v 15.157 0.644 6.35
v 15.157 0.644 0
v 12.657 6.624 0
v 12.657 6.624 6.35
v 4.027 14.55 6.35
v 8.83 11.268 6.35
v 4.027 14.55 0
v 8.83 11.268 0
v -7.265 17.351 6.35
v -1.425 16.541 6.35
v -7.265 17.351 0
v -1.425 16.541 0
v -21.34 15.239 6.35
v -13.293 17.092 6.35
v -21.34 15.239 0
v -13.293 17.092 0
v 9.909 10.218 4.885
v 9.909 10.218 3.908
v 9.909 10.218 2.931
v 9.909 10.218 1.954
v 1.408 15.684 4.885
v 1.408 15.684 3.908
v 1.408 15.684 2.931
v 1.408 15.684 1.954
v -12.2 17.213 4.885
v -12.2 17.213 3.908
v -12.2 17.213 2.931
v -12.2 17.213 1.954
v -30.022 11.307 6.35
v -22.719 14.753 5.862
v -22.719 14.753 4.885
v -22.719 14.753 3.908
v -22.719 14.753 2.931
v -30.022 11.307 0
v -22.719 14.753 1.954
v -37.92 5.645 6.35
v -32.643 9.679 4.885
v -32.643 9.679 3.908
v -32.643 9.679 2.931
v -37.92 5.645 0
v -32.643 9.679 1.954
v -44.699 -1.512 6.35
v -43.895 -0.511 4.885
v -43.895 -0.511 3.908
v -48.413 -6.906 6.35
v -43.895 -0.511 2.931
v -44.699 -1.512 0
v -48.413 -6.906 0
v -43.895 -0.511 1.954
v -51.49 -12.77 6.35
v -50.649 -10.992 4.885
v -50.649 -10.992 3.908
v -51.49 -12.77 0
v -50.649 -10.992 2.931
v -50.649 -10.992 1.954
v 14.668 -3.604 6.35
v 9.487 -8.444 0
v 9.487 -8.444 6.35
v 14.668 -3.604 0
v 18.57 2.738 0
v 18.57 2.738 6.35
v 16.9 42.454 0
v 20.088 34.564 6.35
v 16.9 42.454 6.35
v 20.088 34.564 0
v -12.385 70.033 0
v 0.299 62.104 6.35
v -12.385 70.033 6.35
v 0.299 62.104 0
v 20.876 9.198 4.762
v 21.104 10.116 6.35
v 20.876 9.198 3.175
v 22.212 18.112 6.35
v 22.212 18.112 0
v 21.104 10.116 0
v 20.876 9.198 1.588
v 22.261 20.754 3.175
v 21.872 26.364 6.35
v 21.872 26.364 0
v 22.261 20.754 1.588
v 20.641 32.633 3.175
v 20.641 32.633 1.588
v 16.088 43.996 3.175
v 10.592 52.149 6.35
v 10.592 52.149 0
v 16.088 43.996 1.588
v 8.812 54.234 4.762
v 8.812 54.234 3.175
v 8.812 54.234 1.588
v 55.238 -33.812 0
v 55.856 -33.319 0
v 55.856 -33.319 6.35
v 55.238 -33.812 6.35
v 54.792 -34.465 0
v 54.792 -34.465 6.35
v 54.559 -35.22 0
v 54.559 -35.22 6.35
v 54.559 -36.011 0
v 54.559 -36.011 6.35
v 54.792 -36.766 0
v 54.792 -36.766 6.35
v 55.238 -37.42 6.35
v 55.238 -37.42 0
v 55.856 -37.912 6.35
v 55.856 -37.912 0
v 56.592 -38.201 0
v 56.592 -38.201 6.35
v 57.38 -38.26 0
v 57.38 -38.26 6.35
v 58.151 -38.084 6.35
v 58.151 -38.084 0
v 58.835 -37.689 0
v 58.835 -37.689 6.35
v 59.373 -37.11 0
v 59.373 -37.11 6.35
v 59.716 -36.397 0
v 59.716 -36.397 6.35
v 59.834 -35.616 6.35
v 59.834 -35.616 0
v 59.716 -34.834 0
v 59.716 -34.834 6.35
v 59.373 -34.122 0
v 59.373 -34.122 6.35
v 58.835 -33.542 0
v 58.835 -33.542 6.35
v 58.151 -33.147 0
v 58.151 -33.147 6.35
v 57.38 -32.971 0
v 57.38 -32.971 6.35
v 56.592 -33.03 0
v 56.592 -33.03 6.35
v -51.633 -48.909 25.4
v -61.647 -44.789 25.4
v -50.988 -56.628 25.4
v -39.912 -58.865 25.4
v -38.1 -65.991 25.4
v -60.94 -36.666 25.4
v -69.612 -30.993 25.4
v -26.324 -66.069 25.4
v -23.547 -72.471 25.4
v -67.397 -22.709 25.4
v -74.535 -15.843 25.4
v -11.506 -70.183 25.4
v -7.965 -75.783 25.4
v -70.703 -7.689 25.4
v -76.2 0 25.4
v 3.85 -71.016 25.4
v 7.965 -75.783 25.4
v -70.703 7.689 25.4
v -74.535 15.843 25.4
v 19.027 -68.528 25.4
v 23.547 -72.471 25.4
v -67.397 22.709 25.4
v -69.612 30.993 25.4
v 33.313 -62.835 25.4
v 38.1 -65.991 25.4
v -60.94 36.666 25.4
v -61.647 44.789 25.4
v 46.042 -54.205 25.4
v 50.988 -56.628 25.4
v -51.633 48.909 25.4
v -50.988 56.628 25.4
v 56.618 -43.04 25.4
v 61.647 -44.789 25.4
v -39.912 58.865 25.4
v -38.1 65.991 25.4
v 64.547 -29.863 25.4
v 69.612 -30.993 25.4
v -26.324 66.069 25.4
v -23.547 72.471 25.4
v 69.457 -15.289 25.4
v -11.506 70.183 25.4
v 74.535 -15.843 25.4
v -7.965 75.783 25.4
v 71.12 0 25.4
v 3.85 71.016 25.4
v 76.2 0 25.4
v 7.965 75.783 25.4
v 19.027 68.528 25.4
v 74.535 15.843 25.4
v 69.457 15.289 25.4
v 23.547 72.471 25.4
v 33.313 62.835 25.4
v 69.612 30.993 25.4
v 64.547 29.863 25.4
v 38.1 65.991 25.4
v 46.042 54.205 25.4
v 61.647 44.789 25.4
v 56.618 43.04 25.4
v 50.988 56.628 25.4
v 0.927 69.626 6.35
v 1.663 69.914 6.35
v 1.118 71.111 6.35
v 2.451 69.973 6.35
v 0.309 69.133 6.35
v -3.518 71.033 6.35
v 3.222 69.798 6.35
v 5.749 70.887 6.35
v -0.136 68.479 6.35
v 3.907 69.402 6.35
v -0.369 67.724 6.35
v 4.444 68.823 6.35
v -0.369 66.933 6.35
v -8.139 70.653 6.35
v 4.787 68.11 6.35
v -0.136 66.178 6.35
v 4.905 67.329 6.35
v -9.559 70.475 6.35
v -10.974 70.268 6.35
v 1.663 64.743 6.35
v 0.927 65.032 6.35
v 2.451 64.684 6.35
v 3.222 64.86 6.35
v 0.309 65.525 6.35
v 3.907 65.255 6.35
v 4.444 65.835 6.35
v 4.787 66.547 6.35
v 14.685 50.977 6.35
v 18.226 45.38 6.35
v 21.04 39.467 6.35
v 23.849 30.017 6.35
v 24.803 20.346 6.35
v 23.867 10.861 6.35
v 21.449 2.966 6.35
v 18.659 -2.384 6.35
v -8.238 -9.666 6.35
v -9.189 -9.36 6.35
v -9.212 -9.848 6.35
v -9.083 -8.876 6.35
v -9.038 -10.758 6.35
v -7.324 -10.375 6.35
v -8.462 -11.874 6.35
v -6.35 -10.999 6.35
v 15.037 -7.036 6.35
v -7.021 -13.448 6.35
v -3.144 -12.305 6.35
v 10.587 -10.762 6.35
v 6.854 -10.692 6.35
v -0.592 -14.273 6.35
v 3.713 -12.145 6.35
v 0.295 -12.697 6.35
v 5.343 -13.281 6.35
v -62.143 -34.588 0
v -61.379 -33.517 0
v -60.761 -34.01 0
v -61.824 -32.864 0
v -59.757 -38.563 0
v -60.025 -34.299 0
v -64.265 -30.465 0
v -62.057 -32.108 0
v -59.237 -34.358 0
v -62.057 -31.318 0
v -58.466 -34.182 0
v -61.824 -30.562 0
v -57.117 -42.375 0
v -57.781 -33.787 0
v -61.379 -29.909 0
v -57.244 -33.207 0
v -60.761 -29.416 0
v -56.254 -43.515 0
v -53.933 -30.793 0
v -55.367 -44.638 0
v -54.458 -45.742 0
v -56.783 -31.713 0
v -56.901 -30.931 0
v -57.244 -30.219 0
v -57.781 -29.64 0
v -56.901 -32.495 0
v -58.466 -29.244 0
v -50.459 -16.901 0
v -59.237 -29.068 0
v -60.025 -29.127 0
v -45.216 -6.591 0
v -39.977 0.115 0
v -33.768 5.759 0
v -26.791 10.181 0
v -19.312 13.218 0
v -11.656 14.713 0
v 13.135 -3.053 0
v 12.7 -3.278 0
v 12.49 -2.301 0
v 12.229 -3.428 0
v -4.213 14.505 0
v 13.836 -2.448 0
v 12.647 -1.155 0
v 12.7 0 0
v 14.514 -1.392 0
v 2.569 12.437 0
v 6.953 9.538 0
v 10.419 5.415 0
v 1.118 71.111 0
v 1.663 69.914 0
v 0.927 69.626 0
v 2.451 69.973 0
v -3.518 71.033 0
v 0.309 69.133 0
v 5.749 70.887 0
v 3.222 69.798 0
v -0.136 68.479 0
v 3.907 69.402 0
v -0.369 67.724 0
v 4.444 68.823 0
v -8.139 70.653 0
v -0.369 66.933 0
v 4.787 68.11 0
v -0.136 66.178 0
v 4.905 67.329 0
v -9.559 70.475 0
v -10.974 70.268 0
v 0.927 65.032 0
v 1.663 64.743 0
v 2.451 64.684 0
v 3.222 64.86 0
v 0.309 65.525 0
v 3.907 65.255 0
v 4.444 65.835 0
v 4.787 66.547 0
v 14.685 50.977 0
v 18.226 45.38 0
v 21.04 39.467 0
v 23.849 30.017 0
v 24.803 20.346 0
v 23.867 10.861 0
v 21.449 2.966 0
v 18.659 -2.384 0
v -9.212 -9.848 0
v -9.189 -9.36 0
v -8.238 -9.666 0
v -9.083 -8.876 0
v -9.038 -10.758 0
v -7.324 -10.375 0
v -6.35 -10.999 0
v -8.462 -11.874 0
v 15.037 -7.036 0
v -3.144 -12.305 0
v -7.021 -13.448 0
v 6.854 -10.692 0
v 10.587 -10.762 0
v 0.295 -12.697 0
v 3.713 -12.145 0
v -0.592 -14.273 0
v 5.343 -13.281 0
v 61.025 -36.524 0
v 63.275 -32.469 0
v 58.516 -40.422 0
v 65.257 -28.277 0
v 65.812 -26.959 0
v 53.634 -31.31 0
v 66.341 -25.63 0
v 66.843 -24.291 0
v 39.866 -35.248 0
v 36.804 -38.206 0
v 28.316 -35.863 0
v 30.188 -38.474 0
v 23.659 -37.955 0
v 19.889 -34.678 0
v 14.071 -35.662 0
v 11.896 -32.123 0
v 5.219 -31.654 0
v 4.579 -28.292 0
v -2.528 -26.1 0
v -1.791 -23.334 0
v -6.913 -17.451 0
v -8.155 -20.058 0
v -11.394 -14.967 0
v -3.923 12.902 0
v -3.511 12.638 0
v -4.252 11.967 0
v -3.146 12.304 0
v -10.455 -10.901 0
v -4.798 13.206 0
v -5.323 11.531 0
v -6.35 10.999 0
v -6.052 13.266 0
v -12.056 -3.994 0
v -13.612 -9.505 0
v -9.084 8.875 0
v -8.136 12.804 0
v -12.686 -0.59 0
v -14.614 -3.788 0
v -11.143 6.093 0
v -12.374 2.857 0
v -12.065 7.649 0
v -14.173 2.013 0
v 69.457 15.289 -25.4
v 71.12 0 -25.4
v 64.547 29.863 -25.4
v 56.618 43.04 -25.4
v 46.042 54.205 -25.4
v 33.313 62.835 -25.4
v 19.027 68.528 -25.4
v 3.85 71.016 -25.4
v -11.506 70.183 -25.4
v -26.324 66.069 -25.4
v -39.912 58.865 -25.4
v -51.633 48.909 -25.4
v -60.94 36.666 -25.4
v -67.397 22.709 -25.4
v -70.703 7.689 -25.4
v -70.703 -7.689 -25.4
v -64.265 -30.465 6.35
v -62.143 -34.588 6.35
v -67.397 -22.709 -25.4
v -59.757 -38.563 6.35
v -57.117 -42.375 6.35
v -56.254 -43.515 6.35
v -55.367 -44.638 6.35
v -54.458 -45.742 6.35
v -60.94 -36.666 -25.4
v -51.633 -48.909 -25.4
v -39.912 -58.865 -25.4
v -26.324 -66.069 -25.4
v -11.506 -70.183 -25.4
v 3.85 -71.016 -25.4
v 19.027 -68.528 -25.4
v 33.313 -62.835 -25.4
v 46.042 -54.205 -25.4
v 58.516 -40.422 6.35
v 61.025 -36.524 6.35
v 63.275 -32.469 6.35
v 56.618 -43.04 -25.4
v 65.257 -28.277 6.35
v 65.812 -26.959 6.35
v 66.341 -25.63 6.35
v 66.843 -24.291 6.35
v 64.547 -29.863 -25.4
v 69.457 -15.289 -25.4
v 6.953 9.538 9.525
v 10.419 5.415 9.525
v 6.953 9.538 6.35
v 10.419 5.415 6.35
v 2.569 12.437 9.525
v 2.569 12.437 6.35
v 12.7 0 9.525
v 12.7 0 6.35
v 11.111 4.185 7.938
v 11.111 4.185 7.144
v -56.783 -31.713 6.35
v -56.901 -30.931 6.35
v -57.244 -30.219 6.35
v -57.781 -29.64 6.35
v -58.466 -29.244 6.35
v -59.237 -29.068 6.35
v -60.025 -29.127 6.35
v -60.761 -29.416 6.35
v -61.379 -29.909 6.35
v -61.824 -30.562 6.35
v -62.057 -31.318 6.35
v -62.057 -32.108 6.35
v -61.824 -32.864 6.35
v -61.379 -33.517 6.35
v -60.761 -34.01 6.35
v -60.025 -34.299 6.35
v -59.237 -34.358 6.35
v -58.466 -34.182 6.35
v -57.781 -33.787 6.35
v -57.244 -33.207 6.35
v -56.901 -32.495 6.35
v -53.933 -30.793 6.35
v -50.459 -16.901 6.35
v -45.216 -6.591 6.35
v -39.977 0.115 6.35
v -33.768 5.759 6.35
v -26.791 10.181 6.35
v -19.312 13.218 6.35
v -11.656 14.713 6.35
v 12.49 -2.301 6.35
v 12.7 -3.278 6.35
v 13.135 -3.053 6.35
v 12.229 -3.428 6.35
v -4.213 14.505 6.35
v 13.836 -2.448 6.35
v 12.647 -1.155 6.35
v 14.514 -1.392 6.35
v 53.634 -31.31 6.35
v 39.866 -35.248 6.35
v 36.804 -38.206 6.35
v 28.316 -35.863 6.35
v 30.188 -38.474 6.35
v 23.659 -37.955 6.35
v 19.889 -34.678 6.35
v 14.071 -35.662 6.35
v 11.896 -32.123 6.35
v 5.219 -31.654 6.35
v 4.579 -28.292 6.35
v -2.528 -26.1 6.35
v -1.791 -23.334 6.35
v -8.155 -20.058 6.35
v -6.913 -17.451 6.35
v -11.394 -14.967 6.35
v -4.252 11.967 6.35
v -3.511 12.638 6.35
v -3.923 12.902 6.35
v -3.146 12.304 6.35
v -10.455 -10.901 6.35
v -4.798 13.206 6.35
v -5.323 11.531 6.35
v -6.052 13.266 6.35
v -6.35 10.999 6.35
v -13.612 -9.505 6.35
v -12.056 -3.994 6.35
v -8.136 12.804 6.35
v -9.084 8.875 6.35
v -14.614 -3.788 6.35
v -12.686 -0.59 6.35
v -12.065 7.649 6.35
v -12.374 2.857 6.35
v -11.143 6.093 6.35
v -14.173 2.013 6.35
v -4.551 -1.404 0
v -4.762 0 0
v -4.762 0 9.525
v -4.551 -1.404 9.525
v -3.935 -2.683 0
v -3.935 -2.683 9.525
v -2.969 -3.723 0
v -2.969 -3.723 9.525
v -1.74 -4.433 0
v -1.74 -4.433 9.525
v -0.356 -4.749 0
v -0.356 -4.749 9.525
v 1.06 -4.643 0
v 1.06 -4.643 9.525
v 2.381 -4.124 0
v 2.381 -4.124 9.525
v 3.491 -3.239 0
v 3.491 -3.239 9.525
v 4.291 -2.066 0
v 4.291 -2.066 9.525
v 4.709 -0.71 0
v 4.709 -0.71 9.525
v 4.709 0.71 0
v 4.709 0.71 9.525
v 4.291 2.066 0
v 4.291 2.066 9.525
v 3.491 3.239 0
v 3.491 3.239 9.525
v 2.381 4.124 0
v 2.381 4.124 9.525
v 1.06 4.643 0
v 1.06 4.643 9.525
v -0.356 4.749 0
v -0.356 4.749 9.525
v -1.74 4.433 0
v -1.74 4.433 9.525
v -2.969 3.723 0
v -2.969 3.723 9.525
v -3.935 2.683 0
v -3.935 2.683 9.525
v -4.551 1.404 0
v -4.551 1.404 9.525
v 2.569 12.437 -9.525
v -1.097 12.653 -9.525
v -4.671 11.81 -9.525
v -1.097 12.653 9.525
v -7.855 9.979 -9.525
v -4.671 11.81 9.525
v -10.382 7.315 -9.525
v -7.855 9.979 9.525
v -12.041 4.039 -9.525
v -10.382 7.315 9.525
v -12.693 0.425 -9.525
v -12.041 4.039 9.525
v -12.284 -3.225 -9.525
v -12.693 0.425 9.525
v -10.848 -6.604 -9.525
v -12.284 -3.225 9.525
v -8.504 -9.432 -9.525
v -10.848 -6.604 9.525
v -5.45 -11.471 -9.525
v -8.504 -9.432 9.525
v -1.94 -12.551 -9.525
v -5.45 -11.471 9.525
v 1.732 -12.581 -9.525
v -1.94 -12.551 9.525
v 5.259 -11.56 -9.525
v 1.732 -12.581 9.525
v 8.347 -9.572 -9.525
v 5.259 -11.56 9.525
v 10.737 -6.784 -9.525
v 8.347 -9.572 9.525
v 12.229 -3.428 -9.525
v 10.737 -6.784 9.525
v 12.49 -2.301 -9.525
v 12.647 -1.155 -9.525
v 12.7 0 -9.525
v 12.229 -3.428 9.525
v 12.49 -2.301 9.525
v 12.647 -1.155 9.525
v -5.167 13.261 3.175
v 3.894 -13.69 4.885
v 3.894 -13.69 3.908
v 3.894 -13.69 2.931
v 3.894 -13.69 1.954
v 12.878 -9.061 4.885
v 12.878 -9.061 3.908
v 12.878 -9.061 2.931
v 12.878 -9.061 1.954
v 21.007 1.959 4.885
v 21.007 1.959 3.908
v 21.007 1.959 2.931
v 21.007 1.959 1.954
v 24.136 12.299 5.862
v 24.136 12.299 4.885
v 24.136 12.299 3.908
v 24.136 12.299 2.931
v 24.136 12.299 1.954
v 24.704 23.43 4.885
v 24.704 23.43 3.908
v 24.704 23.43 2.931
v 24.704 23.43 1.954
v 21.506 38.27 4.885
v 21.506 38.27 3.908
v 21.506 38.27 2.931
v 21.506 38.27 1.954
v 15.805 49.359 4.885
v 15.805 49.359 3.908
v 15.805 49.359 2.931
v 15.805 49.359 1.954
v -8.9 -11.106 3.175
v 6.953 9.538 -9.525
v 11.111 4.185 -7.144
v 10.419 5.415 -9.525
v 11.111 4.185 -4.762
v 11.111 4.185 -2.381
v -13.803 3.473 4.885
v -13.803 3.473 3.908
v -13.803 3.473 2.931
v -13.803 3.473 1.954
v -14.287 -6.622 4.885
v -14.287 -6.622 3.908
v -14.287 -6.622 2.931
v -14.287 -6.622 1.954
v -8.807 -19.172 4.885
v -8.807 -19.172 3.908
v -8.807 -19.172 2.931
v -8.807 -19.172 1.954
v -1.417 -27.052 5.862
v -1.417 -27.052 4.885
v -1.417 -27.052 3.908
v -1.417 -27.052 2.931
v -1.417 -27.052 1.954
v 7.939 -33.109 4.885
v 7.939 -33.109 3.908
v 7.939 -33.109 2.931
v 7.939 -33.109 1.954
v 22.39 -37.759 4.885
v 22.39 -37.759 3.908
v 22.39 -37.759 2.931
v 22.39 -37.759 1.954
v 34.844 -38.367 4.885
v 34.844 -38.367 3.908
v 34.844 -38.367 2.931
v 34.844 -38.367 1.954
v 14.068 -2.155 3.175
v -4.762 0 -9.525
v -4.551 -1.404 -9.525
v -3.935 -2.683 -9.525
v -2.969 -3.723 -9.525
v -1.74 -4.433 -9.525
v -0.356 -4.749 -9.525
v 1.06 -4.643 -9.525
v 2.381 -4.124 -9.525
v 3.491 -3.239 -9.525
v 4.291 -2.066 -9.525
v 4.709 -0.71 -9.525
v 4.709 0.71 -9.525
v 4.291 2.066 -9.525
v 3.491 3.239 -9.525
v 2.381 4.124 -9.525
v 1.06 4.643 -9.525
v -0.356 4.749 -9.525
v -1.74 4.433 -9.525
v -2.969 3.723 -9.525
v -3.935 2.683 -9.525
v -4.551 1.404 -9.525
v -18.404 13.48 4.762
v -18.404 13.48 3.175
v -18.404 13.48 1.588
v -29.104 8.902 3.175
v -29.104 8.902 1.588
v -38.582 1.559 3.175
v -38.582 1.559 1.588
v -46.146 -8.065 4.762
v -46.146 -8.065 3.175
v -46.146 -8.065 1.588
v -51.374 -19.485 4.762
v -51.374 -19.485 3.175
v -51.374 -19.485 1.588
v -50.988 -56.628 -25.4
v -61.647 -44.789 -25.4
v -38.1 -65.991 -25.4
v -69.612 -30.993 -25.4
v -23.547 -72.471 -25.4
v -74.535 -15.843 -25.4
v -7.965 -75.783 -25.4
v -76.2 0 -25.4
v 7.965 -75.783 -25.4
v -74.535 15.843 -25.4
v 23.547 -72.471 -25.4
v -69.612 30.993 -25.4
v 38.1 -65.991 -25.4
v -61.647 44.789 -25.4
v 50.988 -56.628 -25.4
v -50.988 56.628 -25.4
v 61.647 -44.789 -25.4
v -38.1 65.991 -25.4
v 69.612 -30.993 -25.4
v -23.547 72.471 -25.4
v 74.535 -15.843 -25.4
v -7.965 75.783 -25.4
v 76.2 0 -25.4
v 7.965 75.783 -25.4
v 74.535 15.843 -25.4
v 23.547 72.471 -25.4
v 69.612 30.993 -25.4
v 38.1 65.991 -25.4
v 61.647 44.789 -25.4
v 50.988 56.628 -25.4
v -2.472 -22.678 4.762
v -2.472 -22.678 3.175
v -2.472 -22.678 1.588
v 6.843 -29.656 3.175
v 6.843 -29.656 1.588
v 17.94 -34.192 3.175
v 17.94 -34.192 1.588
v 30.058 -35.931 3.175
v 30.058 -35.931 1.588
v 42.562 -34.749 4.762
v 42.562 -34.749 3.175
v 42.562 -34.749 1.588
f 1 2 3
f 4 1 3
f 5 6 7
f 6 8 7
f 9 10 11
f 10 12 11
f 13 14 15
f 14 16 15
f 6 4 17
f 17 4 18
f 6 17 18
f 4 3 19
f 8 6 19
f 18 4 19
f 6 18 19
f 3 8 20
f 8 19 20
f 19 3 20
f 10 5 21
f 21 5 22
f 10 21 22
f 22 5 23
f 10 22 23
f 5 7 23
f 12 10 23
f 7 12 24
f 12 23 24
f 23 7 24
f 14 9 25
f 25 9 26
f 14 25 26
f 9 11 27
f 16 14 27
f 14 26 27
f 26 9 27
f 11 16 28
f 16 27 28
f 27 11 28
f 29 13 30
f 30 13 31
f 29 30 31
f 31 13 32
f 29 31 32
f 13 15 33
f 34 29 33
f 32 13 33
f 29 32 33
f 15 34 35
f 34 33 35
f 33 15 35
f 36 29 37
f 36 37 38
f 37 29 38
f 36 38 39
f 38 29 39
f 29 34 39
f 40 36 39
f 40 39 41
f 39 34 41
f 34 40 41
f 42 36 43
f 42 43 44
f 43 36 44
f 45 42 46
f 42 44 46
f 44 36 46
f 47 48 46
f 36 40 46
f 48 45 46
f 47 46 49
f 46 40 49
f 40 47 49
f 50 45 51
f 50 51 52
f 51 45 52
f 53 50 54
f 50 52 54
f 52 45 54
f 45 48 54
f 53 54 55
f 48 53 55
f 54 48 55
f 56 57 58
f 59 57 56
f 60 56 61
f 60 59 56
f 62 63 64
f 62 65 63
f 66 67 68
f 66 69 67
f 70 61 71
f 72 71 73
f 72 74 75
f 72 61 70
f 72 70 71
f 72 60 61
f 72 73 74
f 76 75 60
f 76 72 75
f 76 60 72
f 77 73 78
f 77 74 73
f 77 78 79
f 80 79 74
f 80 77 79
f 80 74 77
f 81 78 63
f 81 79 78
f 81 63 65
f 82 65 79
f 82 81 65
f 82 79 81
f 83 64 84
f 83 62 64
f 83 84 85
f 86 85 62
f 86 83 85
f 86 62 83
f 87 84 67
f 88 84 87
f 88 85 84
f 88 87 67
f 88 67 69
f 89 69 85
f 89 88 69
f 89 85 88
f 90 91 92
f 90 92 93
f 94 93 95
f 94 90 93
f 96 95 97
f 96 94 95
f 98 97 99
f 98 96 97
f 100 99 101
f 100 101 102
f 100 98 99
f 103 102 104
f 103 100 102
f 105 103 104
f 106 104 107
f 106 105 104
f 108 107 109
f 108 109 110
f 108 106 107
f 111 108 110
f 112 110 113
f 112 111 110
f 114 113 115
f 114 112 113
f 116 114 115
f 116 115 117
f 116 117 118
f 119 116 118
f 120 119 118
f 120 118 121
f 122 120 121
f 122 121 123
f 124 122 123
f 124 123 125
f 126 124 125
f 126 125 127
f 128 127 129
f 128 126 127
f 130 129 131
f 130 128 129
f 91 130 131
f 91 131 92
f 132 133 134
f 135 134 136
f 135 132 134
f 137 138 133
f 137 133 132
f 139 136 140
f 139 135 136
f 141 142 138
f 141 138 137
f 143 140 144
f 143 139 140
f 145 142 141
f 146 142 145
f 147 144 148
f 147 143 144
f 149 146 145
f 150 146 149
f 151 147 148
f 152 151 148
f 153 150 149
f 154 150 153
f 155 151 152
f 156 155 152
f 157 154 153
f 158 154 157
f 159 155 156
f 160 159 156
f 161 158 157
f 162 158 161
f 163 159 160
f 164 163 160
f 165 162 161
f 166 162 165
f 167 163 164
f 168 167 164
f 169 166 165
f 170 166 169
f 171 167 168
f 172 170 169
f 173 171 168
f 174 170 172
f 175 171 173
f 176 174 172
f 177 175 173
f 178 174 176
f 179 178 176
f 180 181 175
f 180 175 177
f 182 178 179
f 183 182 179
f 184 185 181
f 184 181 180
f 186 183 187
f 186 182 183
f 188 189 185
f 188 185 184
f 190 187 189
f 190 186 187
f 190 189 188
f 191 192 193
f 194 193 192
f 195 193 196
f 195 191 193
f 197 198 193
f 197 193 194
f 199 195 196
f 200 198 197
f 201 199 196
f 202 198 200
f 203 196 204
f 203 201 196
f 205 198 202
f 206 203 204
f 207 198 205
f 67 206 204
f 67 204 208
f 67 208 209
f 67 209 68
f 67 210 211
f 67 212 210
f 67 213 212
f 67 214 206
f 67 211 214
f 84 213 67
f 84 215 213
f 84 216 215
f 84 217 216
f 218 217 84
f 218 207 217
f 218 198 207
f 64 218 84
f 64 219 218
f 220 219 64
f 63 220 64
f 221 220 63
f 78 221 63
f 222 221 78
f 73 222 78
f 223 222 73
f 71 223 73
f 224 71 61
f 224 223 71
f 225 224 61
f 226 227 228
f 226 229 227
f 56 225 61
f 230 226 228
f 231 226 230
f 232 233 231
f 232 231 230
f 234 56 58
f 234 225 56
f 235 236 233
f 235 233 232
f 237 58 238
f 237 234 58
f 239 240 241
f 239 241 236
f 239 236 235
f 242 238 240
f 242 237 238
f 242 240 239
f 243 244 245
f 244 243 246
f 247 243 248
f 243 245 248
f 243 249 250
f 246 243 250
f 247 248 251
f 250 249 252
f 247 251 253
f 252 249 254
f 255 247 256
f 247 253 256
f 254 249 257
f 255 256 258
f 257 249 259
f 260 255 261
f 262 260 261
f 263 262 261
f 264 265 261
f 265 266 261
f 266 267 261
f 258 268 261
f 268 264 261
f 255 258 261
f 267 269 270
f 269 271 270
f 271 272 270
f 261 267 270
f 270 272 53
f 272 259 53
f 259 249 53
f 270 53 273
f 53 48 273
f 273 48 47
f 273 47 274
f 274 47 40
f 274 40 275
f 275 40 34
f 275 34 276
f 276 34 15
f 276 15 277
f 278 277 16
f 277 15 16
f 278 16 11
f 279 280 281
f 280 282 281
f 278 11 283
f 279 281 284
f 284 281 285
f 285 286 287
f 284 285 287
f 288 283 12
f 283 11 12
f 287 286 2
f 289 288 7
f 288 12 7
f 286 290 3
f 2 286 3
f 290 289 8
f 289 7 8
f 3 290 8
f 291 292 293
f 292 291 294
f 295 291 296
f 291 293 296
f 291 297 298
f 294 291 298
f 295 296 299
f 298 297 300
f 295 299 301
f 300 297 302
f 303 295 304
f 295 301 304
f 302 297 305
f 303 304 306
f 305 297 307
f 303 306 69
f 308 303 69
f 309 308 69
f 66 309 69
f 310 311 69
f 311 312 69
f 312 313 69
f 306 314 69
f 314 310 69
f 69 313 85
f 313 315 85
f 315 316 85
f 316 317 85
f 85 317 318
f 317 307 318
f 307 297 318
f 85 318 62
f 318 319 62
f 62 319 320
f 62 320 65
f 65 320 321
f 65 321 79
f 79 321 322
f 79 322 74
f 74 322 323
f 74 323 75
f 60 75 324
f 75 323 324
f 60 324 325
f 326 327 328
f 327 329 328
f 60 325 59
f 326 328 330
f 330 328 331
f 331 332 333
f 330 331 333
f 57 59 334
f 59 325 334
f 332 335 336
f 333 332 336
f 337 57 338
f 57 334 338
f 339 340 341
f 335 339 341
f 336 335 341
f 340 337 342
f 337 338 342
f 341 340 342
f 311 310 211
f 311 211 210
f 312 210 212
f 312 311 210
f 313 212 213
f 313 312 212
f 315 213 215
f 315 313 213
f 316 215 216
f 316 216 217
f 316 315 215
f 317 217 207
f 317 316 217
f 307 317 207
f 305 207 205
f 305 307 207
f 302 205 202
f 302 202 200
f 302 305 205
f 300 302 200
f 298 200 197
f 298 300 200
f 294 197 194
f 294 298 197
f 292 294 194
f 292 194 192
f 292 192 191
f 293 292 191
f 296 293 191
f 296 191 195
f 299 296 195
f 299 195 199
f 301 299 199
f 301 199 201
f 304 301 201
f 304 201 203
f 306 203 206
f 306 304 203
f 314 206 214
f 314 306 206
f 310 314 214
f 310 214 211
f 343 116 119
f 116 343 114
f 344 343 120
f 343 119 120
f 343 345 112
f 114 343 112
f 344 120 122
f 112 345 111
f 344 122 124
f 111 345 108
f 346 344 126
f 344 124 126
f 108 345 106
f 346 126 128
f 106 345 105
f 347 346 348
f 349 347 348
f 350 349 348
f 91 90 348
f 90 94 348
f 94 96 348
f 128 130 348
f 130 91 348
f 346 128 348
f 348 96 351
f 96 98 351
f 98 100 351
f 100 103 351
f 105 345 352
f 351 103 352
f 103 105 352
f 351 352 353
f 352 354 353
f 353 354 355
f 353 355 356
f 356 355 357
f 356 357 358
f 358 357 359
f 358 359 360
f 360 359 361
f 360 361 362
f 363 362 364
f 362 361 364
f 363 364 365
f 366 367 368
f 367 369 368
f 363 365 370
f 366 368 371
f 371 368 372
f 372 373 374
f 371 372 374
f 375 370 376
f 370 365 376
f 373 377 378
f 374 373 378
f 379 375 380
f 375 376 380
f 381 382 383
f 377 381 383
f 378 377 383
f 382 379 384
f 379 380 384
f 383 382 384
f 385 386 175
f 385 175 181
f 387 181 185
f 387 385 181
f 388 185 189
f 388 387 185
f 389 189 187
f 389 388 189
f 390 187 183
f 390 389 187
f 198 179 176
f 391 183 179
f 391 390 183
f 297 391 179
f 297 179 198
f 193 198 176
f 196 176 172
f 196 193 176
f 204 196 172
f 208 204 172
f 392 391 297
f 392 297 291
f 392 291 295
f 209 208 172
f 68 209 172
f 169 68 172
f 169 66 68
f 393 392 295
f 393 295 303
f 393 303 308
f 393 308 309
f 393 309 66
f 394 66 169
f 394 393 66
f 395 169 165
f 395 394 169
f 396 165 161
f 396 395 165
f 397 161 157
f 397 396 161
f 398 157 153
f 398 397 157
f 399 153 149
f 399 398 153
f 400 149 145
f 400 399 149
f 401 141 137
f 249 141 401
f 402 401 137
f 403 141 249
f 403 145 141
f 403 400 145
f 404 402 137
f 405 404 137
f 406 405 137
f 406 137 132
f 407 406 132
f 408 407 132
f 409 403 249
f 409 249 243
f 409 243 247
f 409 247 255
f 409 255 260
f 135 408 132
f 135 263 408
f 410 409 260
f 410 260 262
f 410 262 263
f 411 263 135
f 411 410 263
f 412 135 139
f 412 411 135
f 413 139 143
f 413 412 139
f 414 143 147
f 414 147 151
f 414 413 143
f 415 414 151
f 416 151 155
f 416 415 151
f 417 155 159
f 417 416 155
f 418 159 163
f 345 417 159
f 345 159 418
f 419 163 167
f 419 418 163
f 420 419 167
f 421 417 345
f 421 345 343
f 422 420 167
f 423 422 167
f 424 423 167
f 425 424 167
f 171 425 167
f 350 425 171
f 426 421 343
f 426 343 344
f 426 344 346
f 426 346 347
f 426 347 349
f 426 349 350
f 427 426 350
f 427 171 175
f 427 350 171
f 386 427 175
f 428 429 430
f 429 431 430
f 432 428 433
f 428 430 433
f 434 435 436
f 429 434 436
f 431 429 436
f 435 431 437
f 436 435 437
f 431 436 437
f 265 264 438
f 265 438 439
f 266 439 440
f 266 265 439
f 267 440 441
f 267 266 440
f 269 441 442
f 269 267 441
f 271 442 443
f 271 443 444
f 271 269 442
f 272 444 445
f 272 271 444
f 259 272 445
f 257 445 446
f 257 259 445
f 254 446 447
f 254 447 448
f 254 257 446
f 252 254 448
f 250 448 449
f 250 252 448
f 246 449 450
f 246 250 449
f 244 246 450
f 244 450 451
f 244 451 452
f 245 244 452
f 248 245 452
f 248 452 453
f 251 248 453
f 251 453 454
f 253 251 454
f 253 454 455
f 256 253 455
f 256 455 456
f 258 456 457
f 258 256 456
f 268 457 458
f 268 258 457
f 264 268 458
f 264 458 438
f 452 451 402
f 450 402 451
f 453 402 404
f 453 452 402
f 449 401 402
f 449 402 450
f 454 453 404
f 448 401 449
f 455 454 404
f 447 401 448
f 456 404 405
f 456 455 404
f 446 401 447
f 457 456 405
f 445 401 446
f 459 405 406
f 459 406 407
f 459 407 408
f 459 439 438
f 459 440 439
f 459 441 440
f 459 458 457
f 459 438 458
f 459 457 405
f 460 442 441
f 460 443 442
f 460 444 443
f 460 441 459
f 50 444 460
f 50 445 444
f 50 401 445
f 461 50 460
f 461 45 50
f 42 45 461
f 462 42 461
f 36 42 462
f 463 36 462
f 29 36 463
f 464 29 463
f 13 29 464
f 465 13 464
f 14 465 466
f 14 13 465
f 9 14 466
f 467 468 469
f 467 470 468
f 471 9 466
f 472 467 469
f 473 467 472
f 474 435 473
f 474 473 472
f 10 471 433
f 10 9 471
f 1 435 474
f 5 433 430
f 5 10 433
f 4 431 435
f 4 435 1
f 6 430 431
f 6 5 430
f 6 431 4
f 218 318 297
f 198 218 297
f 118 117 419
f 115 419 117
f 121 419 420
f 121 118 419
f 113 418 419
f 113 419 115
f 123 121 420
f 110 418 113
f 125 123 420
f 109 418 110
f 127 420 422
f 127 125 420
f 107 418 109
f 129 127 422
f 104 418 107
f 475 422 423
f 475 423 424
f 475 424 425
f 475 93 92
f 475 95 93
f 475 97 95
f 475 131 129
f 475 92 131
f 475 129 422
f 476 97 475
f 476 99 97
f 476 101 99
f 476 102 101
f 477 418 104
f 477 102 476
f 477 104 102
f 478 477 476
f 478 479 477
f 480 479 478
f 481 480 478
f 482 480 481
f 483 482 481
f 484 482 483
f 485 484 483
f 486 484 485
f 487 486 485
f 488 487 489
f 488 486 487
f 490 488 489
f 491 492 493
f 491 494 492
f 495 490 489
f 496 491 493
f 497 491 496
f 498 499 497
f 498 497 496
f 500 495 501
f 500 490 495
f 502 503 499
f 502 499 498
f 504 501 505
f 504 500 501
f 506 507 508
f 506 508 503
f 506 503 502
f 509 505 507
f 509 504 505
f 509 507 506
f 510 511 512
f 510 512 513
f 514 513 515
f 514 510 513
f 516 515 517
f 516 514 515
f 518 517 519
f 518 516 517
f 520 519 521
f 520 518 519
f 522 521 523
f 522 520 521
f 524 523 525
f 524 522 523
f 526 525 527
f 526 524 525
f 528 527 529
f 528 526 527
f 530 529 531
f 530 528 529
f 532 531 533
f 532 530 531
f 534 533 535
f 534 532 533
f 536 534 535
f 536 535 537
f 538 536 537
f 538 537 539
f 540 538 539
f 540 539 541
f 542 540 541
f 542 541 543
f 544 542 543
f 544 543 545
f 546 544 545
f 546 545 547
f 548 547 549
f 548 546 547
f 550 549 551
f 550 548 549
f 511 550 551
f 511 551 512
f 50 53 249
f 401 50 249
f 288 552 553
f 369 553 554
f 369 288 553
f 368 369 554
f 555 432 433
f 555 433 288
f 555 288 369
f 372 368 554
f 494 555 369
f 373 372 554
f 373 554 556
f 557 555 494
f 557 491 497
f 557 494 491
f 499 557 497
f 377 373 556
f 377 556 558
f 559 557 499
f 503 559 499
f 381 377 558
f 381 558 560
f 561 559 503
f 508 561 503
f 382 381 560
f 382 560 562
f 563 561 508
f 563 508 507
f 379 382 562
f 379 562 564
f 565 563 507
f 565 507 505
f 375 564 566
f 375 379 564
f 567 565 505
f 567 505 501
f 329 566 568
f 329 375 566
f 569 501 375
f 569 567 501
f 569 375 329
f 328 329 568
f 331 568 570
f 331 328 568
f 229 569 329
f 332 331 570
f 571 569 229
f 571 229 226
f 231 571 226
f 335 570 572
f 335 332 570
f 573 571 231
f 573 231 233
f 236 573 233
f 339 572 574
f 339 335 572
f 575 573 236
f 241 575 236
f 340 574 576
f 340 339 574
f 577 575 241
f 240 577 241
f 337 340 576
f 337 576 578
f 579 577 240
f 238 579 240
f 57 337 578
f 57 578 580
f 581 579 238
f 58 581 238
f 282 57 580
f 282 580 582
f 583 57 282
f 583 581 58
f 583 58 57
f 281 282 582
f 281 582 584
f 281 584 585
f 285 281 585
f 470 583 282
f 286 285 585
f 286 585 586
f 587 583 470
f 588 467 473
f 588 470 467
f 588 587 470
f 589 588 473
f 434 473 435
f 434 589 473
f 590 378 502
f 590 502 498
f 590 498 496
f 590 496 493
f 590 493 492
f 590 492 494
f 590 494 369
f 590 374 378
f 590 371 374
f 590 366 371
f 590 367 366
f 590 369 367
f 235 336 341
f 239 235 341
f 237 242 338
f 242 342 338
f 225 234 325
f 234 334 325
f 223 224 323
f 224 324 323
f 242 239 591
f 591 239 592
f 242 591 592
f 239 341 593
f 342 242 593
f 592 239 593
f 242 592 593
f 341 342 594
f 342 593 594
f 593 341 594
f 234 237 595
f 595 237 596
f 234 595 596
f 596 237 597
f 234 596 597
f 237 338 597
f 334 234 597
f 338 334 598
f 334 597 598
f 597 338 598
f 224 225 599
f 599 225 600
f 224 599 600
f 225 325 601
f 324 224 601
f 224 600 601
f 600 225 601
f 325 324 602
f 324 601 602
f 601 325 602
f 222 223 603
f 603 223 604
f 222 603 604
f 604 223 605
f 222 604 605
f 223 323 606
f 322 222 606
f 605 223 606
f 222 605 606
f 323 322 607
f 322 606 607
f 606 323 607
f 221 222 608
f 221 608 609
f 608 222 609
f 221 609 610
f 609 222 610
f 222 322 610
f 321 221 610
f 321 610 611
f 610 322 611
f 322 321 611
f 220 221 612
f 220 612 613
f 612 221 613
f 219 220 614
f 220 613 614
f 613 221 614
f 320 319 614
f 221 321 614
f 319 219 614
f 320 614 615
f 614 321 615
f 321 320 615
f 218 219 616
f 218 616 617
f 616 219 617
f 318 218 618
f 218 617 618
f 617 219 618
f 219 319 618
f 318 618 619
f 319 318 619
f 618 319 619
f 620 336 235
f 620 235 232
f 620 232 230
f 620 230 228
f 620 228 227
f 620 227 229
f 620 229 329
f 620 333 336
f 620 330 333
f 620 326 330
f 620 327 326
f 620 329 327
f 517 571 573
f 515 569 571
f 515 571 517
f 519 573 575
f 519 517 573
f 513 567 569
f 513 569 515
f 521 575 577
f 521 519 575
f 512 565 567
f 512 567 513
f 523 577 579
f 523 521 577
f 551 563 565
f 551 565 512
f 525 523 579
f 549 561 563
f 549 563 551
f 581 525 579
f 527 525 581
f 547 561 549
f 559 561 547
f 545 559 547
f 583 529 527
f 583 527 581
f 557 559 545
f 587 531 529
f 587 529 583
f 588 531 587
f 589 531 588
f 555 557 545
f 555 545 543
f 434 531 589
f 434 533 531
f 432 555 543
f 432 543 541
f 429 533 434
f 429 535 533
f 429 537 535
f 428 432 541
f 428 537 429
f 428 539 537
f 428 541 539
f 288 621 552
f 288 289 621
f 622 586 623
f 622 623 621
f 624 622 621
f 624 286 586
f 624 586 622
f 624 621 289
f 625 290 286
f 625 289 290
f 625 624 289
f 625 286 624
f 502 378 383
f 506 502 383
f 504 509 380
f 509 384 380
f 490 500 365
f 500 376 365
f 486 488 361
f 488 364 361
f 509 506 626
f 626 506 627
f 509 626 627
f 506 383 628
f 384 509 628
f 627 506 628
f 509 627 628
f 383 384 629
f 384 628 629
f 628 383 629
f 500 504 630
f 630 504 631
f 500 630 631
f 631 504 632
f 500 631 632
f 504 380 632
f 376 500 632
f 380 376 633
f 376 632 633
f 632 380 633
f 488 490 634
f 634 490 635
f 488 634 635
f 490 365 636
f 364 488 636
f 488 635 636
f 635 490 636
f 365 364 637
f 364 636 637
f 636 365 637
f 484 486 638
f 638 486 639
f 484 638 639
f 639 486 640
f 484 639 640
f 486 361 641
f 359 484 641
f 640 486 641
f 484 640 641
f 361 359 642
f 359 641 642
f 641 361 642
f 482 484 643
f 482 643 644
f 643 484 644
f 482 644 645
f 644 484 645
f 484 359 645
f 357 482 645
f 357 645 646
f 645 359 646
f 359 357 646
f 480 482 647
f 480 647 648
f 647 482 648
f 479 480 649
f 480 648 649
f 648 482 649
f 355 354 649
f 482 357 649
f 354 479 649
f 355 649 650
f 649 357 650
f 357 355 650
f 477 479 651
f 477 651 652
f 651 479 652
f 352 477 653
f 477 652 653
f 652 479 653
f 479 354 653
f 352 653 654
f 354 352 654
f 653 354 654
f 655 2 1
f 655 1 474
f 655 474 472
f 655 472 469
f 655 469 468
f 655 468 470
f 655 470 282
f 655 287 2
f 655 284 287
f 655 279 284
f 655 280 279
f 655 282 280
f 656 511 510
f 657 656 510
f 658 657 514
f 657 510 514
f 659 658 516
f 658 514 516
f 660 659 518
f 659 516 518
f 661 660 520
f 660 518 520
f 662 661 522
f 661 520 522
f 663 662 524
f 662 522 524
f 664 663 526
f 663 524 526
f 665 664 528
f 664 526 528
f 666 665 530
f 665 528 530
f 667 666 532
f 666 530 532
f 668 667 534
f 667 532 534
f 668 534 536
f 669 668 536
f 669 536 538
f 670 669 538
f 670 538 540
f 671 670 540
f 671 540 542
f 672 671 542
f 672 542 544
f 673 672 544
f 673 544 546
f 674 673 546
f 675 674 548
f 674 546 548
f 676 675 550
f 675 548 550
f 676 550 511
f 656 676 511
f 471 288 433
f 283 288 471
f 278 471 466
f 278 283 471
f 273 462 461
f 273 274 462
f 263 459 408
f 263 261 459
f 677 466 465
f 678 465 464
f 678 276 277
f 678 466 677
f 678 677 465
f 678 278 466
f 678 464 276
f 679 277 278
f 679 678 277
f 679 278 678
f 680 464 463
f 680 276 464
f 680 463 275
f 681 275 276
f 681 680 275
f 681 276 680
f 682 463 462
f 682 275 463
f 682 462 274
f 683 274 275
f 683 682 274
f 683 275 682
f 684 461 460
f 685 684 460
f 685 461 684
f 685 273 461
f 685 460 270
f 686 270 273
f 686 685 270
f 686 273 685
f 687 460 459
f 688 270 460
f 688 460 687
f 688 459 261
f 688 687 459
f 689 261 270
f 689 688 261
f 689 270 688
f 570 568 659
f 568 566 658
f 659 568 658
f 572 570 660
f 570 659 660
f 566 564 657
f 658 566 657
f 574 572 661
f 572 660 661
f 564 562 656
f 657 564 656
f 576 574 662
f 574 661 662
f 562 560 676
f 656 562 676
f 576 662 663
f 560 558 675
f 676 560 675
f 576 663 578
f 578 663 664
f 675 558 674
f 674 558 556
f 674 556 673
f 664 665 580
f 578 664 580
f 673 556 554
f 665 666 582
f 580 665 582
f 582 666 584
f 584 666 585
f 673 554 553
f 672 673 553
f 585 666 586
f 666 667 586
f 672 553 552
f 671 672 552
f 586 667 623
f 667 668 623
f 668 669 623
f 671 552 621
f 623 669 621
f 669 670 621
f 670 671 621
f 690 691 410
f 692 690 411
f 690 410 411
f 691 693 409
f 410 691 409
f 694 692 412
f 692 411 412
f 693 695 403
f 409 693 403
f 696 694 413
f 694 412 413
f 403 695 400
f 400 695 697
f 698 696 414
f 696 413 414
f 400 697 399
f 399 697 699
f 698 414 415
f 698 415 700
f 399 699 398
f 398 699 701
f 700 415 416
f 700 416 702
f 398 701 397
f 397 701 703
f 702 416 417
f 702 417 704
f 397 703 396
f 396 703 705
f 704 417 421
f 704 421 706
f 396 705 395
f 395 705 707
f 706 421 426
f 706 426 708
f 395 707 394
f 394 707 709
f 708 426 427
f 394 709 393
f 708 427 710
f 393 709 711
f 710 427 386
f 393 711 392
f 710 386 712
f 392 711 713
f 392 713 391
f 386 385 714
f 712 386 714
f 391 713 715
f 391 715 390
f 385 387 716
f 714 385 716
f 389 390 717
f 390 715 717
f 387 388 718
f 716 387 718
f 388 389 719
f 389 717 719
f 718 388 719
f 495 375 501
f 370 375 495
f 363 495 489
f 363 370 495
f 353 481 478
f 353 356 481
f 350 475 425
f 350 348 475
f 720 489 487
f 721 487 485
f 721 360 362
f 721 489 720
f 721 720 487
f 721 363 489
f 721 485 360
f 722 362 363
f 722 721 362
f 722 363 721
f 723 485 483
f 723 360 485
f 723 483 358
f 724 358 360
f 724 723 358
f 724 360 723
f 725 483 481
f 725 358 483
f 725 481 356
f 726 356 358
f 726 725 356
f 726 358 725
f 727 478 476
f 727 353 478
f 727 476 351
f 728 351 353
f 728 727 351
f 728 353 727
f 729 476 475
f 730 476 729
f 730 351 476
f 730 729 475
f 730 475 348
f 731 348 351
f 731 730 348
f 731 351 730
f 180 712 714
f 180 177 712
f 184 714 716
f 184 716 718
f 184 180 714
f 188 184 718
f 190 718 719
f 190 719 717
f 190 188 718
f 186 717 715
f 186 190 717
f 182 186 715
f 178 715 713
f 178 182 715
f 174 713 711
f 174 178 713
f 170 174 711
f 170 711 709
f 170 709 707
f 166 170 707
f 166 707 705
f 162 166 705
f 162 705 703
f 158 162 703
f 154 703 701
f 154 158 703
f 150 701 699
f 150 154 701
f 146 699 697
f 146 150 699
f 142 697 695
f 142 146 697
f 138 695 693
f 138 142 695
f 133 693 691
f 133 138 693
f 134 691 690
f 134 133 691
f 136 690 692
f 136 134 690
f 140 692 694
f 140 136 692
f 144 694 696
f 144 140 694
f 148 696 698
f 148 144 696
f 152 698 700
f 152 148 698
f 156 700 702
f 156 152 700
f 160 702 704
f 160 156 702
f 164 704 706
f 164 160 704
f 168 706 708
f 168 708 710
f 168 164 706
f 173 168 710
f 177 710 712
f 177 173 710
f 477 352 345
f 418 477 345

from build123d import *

# Parameters (mm, degrees)
SKETCH1_R            = 76.2
BOSS_EXTRUDE8_DEPTH  = 25.4
SKETCH1_3_R          = 2.652133243
BOSS_EXTRUDE9_DEPTH  = 6.35
SKETCH1_4_R          = 4.7625
BOSS_EXTRUDE10_DEPTH = 9.525
CIRPATTERN2_COUNT    = 3


with BuildPart() as part:
    # Sketch1 → Boss-Extrude8 (new, symmetric)
    with BuildSketch(Plane.XY):
        Circle(SKETCH1_R)
        with BuildLine():
            ThreePointArc((-64.2646615, -30.464859794), (-15.613322422, 69.385002435), (71.12, 0))
            ThreePointArc((71.12, 0), (24.341278866, -66.824819814), (-54.458080516, -45.74245147))
            ThreePointArc((-54.458080516, -45.74245147), (-55.813104666, -44.078926343), (-57.117332526, -42.375284367))
            ThreePointArc((-57.117332526, -42.375284367), (-60.982470201, -36.594982282), (-64.2646615, -30.464859794))
        make_face(mode=Mode.SUBTRACT)
    extrude(amount=BOSS_EXTRUDE8_DEPTH, both=True)

    # Sketch1<3> → Boss-Extrude9 (add)
    with BuildSketch(Plane.XY):
        with BuildLine():
            Line((-51.489686485, -12.770329882), (-64.2646615, -30.464859794))
            ThreePointArc((-64.2646615, -30.464859794), (-59.850844353, -38.417845205), (-54.458080516, -45.74245147))
            add(Edge.make_bspline(
                [(-54.458080516, -45.74245147), (-56.227173503, -12.770464941), (-42.479312579, 17.840425436), (5.439933994, 27.701840724), (12.7, 0)],
                knots=[0.164688389, 0.164688389, 0.164688389, 0.164688389, 0.164688389, 1.164688389, 1.164688389, 1.164688389, 1.164688389, 1.164688389], degree=4))
            ThreePointArc((12.7, 0), (12.581598046, -1.730141787), (12.228599905, -3.42802339))
            add(Edge.make_bspline(
                [(15.157020591, 0.643933082), (14.443060628, -2.918429068), (12.228599905, -3.42802339)],
                knots=[0, 0, 0, 0.719883781, 0.719883781, 0.719883781], degree=2))
            add(Edge.make_bspline(
                [(15.157020591, 0.643933082), (14.991425957, 1.275783561), (14.604911637, 2.54097033), (13.667954828, 4.887393309), (12.183192976, 7.556706342), (9.969654094, 10.294956422), (6.534622803, 13.326938907), (1.520056493, 15.963955949), (-5.168911286, 17.446899809), (-12.189081027, 17.436980233), (-21.635438647, 15.634364862), (-33.013454155, 10.343487809), (-43.696960831, 0.683796899), (-49.136108914, -7.765497225), (-51.219142397, -12.1715848), (-51.489686485, -12.770329882)],
                knots=[0, 0, 0, 0, 0.015625, 0.03125, 0.0625, 0.09375, 0.125, 0.1875, 0.25, 0.3125, 0.375, 0.5, 0.625, 0.725480641, 0.741105641, 0.741105641, 0.741105641, 0.741105641], degree=3))
        make_face()
        with Locations((-59.434967194, -31.713129844)):
            Circle(SKETCH1_3_R, mode=Mode.SUBTRACT)
    boss_extrude9 = extrude(amount=BOSS_EXTRUDE9_DEPTH)

    # Sketch1<4> → Boss-Extrude10 (add, symmetric)
    with BuildSketch(Plane.XY):
        with BuildLine():
            add(Edge.make_bspline(
                [(12.7, 0), (11.504351428, 4.56217151), (9.205933773, 8.105542424), (6.138994382, 10.705215229), (2.569011428, 12.437450715)],
                knots=[0, 0, 0, 0, 0, 0.164688389, 0.164688389, 0.164688389, 0.164688389, 0.164688389], degree=4))
            ThreePointArc((2.569011428, 12.437450715), (-10.847609987, -6.604495254), (12.228599905, -3.42802339))
            ThreePointArc((12.228599905, -3.42802339), (12.581598046, -1.730141787), (12.7, 0))
        make_face()
        Circle(SKETCH1_4_R, mode=Mode.SUBTRACT)
    extrude(amount=BOSS_EXTRUDE10_DEPTH, both=True)

    # CirPattern2: Boss-Extrude9 ×3 about axis
    cirpattern2_axis = Axis((0, 0, -27.94), (0, 0, 1))
    for i in range(1, CIRPATTERN2_COUNT):
        add(boss_extrude9.rotate(cirpattern2_axis, i * 360 / CIRPATTERN2_COUNT))


solid = part.part
